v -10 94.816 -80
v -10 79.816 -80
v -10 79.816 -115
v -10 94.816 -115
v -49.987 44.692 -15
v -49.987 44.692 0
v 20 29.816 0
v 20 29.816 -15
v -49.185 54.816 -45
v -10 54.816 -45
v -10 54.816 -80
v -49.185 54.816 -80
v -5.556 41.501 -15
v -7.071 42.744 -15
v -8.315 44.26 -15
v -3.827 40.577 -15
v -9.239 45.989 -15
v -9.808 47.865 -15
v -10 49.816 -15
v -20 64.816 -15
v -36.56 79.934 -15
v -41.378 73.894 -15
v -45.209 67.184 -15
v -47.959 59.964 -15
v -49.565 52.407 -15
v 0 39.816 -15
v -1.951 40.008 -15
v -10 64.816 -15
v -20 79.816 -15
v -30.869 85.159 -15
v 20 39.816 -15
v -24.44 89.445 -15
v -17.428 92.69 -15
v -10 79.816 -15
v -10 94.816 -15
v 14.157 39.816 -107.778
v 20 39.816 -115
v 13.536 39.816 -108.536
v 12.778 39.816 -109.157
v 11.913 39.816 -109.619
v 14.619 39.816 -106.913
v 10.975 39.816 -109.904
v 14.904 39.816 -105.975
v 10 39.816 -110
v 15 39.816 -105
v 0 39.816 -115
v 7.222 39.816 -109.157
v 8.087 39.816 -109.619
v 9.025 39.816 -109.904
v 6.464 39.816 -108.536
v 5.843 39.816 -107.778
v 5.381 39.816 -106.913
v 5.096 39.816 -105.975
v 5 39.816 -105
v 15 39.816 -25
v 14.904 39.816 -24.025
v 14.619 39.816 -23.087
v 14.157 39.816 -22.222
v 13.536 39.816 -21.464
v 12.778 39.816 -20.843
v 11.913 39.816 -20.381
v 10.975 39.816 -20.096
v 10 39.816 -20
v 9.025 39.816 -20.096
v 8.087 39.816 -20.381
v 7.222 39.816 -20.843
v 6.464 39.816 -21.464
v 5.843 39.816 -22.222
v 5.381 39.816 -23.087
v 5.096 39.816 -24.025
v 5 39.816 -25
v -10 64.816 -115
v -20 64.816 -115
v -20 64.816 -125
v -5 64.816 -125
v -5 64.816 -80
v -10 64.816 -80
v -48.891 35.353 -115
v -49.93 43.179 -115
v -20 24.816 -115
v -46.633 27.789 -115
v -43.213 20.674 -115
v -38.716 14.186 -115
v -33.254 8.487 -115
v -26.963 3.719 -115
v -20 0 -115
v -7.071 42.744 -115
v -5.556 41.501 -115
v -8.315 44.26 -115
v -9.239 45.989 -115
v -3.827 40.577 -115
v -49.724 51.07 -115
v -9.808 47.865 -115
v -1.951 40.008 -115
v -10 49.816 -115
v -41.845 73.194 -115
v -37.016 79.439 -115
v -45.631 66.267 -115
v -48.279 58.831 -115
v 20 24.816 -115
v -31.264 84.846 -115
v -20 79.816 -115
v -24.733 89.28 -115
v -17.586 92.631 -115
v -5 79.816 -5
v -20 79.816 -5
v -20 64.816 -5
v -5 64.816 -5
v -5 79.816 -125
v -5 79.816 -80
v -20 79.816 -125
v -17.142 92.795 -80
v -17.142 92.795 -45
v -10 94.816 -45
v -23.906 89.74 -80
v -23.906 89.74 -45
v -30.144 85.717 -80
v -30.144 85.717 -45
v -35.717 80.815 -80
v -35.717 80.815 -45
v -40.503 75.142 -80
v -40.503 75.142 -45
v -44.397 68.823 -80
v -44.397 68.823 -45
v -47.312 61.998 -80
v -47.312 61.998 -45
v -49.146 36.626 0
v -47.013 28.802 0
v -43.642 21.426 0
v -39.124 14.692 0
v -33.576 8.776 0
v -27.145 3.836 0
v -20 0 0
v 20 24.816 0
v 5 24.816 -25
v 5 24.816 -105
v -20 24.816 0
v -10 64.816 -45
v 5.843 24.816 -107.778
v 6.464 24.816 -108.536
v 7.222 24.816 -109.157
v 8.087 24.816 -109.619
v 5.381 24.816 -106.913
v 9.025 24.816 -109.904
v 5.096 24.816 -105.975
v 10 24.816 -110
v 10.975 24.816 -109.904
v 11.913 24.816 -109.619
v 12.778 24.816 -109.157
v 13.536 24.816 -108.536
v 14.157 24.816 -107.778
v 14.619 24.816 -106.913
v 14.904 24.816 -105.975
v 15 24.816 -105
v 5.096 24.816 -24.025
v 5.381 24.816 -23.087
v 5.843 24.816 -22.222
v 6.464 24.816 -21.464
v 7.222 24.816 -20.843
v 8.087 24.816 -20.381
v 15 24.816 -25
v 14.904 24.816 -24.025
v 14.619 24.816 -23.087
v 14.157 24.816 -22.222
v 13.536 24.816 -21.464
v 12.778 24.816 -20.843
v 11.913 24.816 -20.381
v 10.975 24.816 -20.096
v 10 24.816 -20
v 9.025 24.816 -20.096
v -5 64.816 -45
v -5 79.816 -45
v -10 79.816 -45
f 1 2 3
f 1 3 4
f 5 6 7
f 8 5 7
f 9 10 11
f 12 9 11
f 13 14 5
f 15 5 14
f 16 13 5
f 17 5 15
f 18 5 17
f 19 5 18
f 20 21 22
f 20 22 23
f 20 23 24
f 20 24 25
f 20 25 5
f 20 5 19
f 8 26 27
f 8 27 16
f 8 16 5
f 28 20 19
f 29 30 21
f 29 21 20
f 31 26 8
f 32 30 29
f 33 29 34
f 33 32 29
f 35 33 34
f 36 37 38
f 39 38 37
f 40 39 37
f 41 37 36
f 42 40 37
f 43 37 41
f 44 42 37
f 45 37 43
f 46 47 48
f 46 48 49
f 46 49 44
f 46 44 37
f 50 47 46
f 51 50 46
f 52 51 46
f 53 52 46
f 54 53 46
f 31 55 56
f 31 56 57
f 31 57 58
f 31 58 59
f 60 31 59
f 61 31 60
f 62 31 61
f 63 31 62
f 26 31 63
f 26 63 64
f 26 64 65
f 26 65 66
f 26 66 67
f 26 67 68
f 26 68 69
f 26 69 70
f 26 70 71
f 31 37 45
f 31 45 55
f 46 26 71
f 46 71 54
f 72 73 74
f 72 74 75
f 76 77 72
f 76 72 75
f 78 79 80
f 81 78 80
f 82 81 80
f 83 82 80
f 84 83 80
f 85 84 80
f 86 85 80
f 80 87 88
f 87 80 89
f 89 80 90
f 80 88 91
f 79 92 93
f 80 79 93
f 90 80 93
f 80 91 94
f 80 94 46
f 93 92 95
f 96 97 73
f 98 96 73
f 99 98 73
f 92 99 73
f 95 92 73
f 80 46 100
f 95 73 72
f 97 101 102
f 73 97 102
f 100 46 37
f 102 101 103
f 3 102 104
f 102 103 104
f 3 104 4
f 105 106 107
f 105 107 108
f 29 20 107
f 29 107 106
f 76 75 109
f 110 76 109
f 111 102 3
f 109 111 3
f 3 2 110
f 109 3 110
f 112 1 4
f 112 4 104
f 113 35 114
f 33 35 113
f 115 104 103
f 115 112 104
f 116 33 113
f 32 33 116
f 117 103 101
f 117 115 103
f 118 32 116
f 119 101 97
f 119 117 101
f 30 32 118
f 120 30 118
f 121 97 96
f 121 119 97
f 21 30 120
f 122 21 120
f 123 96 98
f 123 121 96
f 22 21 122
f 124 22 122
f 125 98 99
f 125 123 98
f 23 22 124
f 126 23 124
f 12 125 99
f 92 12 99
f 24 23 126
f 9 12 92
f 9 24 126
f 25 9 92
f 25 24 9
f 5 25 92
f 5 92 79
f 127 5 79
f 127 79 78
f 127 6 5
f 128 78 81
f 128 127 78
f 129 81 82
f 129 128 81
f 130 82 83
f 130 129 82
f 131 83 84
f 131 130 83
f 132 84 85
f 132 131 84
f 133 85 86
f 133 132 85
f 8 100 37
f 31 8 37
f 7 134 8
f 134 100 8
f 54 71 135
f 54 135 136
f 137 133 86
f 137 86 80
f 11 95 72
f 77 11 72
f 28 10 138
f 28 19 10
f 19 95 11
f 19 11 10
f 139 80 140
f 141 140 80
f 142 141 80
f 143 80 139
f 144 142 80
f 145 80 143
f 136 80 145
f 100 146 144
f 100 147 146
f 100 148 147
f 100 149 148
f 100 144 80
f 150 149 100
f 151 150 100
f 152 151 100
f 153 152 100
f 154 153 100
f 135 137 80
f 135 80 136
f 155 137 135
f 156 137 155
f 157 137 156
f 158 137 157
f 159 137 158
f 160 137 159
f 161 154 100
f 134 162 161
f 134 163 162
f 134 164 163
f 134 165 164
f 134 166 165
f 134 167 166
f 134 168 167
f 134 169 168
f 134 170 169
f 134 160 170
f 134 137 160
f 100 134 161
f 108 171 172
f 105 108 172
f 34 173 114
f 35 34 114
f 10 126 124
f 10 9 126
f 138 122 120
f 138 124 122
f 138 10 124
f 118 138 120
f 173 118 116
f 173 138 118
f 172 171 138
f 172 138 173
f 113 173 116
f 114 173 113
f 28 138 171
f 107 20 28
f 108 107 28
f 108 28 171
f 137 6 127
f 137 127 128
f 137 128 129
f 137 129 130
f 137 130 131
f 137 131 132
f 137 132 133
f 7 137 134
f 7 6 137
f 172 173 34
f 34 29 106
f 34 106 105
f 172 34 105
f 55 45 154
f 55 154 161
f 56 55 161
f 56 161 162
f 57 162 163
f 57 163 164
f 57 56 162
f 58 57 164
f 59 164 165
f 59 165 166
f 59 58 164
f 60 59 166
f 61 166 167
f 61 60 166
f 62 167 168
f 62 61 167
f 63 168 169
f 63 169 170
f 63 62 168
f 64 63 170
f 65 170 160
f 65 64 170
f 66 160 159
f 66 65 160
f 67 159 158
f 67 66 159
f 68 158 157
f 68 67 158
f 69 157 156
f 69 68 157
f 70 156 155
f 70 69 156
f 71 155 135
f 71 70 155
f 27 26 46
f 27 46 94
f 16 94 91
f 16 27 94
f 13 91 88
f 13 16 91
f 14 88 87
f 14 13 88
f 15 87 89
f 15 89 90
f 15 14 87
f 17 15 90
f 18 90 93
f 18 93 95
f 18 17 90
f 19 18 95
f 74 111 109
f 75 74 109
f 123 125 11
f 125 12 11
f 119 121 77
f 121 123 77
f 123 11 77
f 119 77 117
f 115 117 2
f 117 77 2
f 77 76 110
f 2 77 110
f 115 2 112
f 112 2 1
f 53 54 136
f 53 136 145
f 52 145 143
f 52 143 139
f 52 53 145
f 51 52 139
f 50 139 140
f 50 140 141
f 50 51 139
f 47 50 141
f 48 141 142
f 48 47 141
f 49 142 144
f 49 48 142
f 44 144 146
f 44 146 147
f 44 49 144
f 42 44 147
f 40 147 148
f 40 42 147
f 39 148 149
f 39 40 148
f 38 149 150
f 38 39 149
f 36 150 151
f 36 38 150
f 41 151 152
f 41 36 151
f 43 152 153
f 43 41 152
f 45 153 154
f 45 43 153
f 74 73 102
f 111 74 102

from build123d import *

# Parameters (mm, degrees)
SKETCH1_W                = 10
SKETCH1_H                = 15
BOSS_EXTRUDE1_DEPTH      = 115
SKETCH1_5_W              = 10
SKETCH1_5_H              = 15
CUT_EXTRUDE1_DEPTH       = 15
SKETCH6_W                = 15
SKETCH6_H                = 15
BOSS_EXTRUDE3_DEPTH      = 52.5
BOSS_EXTRUDE3_DEPTH_BACK = 67.5
CUT_EXTRUDE2_REACH       = 47
SKETCH7_W                = 35
SKETCH7_H                = 40
CUT_EXTRUDE3_DEPTH       = 15


with BuildPart() as part:
    # Sketch1 → Boss-Extrude1 (new body)
    with BuildSketch(Plane.XY):
        with BuildLine():
            Line((-10, 79.815551805), (-10, 94.815551805))
            ThreePointArc((-10, 94.815551805), (-39.085961763, 77.007283421), (-49.987139252, 44.691777486))
            Line((-49.987139252, 44.691777486), (20, 29.815551805))
            Line((20, 29.815551805), (20, 39.815551805))
            Line((20, 39.815551805), (0, 39.815551805))
            ThreePointArc((0, 39.815551805), (-7.071067812, 42.744483993), (-10, 49.815551805))
            Line((-10, 49.815551805), (-10, 64.815551805))
            Line((-10, 64.815551805), (-20, 64.815551805))
            Line((-20, 64.815551805), (-20, 79.815551805))
            Line((-20, 79.815551805), (-10, 79.815551805))
        make_face()
        with BuildLine():
            Line((20, 29.815551805), (-49.987139252, 44.691777486))
            ThreePointArc((-49.987139252, 44.691777486), (-41.519738184, 17.96698201), (-20, 0))
            Line((-20, 0), (-20, 24.815551805))
            Line((-20, 24.815551805), (20, 24.815551805))
            Line((20, 24.815551805), (20, 29.815551805))
        make_face()
        with Locations((-15, 72.315551805)):
            Rectangle(SKETCH1_W, SKETCH1_H)
    extrude(amount=-BOSS_EXTRUDE1_DEPTH)

    # Sketch1<5> → Cut-Extrude1 (cut)
    with BuildSketch(Plane.XY):
        with BuildLine():
            Line((-10, 79.815551805), (-10, 94.815551805))
            ThreePointArc((-10, 94.815551805), (-39.085961763, 77.007283421), (-49.987139252, 44.691777486))
            Line((-49.987139252, 44.691777486), (20, 29.815551805))
            Line((20, 29.815551805), (20, 39.815551805))
            Line((20, 39.815551805), (0, 39.815551805))
            ThreePointArc((0, 39.815551805), (-7.071067812, 42.744483993), (-10, 49.815551805))
            Line((-10, 49.815551805), (-10, 64.815551805))
            Line((-10, 64.815551805), (-20, 64.815551805))
            Line((-20, 64.815551805), (-20, 79.815551805))
            Line((-20, 79.815551805), (-10, 79.815551805))
        make_face()
        with Locations((-15, 72.315551805)):
            Rectangle(SKETCH1_5_W, SKETCH1_5_H)
    extrude(amount=-CUT_EXTRUDE1_DEPTH, mode=Mode.SUBTRACT)

    # Sketch6 → Boss-Extrude3 (add, two sides)
    with BuildSketch(Plane.XY.offset(-57.5)) as boss_extrude3_sk:
        with Locations((-12.5, 72.315551805)):
            Rectangle(SKETCH6_W, SKETCH6_H)
    extrude(amount=BOSS_EXTRUDE3_DEPTH)
    extrude(boss_extrude3_sk.sketch, amount=-BOSS_EXTRUDE3_DEPTH_BACK)

    # Sketch7 → Cut-Extrude2 (cut, up to next)
    with BuildSketch(Plane(origin=(-5, 0, 0), x_dir=(0, 0, -1), z_dir=(1, 0, 0)), mode=Mode.PRIVATE) as cut_extrude2_sk1:
        with Locations((62.5, 74.815551805)):
            Rectangle(SKETCH7_W, SKETCH7_H)
    cut_extrude2_tool1 = extrude(cut_extrude2_sk1.sketch, amount=-CUT_EXTRUDE2_REACH, mode=Mode.PRIVATE) & part.part
    add(cut_extrude2_tool1.solids().sort_by_distance((-5, 74.815552, -62.5))[0], mode=Mode.SUBTRACT)

    # Sketch8 → Cut-Extrude3 (cut)
    with BuildSketch(Plane(origin=(0, 39.815551805, 0), x_dir=(1, 0, 0), z_dir=(0, 1, 0))):
        with BuildLine():
            Line((5, 25), (5, 105))
            ThreePointArc((5, 105), (10, 110), (15, 105))
            Line((15, 105), (15, 25))
            ThreePointArc((15, 25), (10, 20), (5, 25))
        make_face()
    extrude(amount=-CUT_EXTRUDE3_DEPTH, mode=Mode.SUBTRACT)


solid = part.part
